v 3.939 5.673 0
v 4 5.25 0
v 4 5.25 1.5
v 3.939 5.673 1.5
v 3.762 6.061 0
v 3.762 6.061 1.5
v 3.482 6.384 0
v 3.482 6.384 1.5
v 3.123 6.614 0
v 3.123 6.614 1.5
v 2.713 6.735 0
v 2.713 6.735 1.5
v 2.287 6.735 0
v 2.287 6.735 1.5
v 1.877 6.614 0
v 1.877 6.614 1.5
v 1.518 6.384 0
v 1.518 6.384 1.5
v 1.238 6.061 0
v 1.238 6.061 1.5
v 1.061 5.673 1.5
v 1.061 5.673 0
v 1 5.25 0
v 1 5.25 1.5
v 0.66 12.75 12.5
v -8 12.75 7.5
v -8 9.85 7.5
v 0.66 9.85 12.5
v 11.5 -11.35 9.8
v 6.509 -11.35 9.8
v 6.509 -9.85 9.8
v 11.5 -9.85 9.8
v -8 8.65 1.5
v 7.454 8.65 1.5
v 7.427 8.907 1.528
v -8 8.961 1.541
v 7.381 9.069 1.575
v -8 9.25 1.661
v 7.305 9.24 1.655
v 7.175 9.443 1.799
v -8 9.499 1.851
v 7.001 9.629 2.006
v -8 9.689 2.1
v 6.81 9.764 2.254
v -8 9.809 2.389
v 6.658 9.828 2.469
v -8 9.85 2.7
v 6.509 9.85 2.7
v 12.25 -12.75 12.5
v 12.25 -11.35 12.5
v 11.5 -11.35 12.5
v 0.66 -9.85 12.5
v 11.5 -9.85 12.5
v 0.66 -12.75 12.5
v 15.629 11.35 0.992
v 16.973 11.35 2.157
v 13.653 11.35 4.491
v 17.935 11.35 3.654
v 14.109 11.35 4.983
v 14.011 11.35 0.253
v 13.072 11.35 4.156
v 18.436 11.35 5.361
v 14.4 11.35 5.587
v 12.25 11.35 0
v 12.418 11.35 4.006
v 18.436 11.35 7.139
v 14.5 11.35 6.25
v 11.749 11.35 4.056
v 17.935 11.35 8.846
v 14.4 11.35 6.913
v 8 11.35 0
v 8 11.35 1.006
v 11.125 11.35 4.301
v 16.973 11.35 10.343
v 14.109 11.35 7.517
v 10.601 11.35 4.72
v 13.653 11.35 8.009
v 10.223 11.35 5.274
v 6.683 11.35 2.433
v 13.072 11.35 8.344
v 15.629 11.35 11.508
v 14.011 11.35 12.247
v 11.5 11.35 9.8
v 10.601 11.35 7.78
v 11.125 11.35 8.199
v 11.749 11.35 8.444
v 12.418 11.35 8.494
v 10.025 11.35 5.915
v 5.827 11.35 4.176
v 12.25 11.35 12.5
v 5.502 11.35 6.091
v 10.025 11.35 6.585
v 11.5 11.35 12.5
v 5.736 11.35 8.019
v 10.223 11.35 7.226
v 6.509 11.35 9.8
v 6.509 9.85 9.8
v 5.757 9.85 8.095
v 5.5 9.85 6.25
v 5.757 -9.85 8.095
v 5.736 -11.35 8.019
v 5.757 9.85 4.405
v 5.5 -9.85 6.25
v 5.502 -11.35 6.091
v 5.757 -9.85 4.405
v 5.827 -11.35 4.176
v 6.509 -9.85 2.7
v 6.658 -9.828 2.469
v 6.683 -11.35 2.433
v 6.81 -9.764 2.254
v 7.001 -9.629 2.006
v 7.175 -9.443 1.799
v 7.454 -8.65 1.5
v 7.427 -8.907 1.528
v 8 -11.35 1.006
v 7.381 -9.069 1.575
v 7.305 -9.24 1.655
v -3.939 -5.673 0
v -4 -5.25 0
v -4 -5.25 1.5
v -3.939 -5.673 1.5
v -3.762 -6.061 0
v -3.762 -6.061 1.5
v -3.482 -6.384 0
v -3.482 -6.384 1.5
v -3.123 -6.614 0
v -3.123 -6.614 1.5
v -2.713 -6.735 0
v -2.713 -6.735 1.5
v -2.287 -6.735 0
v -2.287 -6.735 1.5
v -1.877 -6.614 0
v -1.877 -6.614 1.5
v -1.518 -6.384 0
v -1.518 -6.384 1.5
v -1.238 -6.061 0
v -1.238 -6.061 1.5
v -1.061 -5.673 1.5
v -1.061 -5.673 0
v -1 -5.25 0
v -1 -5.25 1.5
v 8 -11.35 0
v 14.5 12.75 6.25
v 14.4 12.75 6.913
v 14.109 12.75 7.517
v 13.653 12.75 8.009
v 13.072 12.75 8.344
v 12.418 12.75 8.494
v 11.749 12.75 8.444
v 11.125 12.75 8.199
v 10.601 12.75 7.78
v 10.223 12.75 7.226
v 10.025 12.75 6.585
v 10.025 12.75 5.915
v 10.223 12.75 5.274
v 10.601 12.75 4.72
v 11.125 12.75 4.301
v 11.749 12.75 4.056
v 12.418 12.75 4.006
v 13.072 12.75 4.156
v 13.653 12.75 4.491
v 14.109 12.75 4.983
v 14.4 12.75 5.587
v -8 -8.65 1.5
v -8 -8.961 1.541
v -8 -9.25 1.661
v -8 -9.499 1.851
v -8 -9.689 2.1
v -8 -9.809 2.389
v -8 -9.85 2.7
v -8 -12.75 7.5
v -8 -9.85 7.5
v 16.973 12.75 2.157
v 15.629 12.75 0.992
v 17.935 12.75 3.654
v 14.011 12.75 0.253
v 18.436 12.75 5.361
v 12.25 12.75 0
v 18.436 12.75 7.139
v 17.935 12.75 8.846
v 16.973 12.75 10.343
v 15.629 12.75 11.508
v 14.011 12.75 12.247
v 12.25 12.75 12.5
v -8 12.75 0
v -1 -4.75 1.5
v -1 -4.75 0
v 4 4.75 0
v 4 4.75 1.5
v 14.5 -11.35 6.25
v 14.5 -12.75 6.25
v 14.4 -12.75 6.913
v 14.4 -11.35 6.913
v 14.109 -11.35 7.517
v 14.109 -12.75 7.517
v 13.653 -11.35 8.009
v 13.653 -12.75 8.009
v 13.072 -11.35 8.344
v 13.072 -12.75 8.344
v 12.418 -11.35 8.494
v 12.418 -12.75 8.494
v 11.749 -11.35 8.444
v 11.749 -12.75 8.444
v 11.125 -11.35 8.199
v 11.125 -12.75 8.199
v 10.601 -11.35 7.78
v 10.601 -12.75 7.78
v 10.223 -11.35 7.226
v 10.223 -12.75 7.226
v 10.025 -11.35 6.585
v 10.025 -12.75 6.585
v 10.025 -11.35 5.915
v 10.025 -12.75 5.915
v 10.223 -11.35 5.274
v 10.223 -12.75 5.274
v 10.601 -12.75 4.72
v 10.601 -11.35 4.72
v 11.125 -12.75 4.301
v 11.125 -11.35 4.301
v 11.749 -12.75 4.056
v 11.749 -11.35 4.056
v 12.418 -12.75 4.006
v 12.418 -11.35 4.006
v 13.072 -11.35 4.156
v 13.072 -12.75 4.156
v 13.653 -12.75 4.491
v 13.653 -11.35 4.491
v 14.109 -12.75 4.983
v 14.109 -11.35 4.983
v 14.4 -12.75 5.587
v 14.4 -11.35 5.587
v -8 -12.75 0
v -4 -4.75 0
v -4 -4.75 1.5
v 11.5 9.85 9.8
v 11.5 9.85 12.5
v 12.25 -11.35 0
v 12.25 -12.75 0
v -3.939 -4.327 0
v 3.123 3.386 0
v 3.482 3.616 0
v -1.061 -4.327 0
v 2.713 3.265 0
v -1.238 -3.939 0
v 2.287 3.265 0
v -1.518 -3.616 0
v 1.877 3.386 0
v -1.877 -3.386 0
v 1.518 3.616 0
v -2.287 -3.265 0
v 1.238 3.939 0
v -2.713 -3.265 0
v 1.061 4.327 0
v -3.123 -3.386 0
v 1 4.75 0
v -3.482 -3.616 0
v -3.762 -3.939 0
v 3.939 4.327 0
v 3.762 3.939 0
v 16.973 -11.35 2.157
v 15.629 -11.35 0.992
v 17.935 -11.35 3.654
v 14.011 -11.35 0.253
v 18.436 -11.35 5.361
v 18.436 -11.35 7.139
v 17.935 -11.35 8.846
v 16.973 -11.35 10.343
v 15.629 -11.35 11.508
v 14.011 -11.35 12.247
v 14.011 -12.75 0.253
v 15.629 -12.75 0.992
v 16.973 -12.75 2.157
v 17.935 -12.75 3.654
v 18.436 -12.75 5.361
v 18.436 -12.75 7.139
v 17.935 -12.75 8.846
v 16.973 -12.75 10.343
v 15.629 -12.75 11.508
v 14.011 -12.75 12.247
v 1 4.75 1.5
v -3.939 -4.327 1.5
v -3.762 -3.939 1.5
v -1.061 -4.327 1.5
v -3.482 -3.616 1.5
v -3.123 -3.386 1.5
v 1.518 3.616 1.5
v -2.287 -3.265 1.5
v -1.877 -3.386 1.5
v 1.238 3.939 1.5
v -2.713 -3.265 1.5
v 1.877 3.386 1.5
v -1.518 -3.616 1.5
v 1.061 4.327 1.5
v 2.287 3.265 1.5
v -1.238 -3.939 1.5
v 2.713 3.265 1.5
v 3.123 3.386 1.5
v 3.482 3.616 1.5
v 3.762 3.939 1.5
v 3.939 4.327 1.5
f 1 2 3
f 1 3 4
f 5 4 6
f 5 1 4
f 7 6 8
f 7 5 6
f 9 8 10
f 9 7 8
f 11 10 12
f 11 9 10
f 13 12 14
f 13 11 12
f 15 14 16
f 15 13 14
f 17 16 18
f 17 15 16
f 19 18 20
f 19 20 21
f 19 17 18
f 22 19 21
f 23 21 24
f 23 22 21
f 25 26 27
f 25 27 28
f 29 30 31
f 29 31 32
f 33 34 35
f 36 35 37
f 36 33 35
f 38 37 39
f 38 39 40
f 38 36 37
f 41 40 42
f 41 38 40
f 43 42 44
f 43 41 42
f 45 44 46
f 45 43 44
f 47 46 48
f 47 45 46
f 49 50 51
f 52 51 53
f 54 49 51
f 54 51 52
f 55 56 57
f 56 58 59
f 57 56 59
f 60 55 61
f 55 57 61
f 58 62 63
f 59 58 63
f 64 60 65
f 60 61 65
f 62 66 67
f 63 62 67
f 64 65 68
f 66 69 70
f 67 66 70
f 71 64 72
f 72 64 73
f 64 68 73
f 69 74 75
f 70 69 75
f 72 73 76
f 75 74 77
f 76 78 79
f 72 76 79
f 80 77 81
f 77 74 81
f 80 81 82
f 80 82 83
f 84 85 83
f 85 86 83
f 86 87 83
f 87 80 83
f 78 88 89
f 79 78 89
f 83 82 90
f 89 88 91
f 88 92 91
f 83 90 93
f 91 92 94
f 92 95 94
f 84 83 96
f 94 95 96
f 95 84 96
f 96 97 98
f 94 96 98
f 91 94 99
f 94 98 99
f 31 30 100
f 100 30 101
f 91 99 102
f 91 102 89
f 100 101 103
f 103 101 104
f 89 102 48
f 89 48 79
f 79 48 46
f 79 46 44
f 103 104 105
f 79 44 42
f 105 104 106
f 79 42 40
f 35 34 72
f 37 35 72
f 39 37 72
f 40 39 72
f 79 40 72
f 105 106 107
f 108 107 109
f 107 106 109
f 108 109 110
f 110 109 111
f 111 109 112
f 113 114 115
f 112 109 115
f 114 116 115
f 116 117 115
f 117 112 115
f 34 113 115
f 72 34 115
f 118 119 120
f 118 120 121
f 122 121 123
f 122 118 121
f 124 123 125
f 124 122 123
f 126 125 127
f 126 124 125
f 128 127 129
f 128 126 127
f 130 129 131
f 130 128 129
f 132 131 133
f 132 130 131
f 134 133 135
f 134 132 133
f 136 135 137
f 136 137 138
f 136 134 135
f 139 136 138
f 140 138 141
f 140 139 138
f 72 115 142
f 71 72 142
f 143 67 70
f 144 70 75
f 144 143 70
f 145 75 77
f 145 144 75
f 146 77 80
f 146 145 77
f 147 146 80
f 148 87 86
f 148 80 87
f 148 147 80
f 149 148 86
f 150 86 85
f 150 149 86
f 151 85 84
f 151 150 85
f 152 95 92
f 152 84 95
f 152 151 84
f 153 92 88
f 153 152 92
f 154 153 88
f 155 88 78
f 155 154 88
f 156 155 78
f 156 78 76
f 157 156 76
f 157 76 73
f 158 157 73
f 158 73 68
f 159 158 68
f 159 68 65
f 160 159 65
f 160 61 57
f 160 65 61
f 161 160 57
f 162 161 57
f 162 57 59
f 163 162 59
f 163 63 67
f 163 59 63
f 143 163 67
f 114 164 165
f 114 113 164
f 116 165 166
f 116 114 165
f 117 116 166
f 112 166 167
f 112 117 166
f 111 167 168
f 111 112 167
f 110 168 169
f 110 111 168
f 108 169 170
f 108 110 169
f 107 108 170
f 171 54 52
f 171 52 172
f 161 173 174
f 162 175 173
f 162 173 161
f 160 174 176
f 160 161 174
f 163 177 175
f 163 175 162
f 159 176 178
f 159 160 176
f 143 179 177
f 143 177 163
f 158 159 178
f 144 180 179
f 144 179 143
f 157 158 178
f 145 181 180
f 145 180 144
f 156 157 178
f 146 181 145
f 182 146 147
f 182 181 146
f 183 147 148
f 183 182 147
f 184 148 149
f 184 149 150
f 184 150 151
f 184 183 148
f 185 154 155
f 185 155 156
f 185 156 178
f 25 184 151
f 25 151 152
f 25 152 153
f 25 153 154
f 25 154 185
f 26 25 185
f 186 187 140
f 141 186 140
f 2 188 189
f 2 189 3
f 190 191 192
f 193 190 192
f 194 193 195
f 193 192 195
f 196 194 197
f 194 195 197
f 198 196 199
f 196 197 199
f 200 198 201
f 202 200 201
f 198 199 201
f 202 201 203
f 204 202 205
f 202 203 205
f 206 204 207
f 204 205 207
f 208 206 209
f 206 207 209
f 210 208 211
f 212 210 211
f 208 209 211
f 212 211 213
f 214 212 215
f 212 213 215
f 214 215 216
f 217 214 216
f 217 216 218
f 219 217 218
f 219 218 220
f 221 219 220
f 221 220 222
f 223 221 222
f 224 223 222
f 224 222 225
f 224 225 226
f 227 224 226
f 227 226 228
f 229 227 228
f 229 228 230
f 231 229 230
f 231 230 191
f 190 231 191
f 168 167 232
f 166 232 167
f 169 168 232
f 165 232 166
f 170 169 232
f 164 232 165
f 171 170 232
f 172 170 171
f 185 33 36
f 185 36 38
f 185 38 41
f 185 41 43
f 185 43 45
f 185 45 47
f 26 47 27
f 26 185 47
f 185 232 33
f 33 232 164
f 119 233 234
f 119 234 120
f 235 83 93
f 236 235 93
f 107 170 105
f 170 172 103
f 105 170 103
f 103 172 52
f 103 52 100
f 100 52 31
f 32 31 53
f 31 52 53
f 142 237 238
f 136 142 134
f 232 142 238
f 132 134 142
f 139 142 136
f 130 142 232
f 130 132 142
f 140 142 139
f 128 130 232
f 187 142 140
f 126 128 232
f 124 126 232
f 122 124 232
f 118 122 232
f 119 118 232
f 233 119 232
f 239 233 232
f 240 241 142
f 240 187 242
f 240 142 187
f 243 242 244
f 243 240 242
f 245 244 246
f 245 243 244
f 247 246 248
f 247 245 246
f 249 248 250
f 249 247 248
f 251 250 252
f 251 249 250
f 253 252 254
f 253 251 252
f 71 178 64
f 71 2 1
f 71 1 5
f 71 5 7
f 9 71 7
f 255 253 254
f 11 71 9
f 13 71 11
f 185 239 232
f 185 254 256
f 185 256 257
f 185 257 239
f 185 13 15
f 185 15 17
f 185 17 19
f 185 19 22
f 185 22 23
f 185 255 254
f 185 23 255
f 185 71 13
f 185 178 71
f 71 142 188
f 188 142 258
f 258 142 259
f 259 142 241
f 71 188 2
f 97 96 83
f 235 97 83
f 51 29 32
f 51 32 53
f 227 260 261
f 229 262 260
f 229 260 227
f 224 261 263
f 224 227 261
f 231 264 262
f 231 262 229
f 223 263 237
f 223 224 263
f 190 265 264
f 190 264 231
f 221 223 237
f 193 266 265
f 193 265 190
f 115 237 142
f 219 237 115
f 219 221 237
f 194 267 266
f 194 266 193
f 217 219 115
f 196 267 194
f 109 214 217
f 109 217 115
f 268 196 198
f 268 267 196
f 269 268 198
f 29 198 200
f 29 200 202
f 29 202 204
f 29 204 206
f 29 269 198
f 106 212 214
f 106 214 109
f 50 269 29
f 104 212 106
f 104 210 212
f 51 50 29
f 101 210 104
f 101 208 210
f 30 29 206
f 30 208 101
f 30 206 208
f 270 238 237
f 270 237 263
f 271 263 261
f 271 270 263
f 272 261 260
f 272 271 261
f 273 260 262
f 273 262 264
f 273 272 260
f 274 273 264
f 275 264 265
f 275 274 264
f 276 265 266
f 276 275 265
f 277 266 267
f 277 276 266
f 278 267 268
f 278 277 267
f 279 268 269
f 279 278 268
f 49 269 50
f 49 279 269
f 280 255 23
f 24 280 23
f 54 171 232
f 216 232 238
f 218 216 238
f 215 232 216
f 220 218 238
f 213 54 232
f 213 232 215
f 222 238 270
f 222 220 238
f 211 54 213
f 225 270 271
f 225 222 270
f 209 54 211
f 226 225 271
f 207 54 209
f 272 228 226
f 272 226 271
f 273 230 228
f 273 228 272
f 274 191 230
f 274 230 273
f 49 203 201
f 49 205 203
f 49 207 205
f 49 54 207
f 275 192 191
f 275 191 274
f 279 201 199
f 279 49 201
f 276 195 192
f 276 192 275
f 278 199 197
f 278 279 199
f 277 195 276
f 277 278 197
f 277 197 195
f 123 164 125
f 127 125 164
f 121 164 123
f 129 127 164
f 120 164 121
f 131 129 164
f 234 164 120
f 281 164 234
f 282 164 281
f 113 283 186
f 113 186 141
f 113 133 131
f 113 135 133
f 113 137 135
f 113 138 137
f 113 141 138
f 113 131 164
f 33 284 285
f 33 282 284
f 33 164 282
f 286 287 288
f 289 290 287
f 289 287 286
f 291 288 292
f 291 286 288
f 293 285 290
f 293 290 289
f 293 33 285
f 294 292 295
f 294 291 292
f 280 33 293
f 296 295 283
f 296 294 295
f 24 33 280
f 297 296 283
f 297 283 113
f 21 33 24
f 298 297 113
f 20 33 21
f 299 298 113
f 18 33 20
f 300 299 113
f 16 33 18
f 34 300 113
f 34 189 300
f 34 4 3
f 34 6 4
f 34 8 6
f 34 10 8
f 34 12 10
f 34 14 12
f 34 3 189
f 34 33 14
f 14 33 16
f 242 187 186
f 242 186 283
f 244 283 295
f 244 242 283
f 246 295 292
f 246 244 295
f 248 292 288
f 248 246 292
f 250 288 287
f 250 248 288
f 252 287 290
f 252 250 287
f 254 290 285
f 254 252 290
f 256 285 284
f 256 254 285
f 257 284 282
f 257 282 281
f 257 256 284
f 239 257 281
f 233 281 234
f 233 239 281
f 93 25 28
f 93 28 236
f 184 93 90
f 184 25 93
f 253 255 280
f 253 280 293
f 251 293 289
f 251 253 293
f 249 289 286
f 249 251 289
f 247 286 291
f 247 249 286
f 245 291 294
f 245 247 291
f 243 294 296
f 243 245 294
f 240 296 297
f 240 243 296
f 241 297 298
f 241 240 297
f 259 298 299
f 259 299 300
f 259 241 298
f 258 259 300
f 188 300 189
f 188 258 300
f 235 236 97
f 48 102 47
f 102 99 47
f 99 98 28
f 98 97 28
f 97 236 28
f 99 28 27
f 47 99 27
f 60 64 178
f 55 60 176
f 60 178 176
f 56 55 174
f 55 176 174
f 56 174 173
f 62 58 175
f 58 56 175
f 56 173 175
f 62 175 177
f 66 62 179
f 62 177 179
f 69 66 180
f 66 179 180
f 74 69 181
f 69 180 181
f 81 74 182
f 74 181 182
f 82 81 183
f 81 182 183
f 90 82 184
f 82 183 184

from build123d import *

# Parameters (mm, degrees)
SKETCH002_W     = 16
SKETCH002_H     = 25.5
PAD_DEPTH       = 1.5
SKETCH003_R     = 2.25
PAD001_DEPTH    = 2.9
SKETCH004_R     = 2.25
PAD002_DEPTH    = 2.9
POCKET_DEPTH    = 11.35
POCKET001_DEPTH = 11.35
FILLET_R        = 1.2


with BuildPart() as part:
    # Sketch002 → Pad (new body)
    with BuildSketch(Plane.XY):
        Rectangle(SKETCH002_W, SKETCH002_H)
        with BuildLine():
            ThreePointArc((1, 4.75), (2.5, 3.25), (4, 4.75))
            Line((4, 4.75), (4, 5.25))
            ThreePointArc((4, 5.25), (2.5, 6.75), (1, 5.25))
            Line((1, 4.75), (1, 5.25))
        make_face(mode=Mode.SUBTRACT)
        with BuildLine():
            ThreePointArc((-1, -4.75), (-2.5, -3.25), (-4, -4.75))
            Line((-4, -4.75), (-4, -5.25))
            ThreePointArc((-4, -5.25), (-2.5, -6.75), (-1, -5.25))
            Line((-1, -4.75), (-1, -5.25))
        make_face(mode=Mode.SUBTRACT)
    extrude(amount=PAD_DEPTH)

    # Sketch003 → Pad001 (join)
    with BuildSketch(Plane.XZ.offset(12.75)):
        with BuildLine():
            ThreePointArc((12.25, 0), (18.500032, 6.25), (12.25, 12.5))
            Line((12.25, 12.5), (0.660254, 12.5))
            Line((0.660254, 12.5), (-8, 7.5))
            Line((-8, 7.5), (-8, 0))
            Line((-8, 0), (12.25, 0))
        make_face()
        with Locations((12.25, 6.25)):
            Circle(SKETCH003_R, mode=Mode.SUBTRACT)
    extrude(amount=-PAD001_DEPTH)

    # Sketch004 → Pad002 (join)
    with BuildSketch(Plane.XZ.offset(-12.75)):
        with BuildLine():
            Line((12.25, 0), (-8, 0))
            Line((-8, 0), (-8, 7.5))
            Line((-8, 7.5), (0.660254, 12.5))
            Line((0.660254, 12.5), (12.25, 12.5))
            ThreePointArc((12.25, 0), (18.500035, 6.25), (12.25, 12.5))
        make_face()
        with Locations((12.250035, 6.25)):
            Circle(SKETCH004_R, mode=Mode.SUBTRACT)
    extrude(amount=PAD002_DEPTH)

    # Sketch005 → Pocket (cut)
    with BuildSketch(Plane.XZ.offset(11.35)):
        with BuildLine():
            Line((18.6, 12.5), (18.6, 0))
            Line((8, 0), (18.6, 0))
            Line((8, 1.005956), (8, 0))
            ThreePointArc((6.50892, 9.8), (5.594985, 5.121605), (8, 1.005956))
            Line((6.50892, 9.8), (11.5, 9.8))
            Line((11.5, 9.8), (11.5, 12.5))
            Line((11.5, 12.5), (18.6, 12.5))
        make_face()
    extrude(amount=-POCKET_DEPTH, mode=Mode.SUBTRACT)

    # Sketch006 → Pocket001 (cut)
    with BuildSketch(Plane.XZ.offset(-11.35)):
        with BuildLine():
            Line((18.6, 12.5), (18.6, 0))
            Line((8, 0), (18.6, 0))
            Line((8, 1.005956), (8, 0))
            ThreePointArc((6.50892, 9.8), (5.594985, 5.121605), (8, 1.005956))
            Line((6.50892, 9.8), (11.5, 9.8))
            Line((11.5, 9.8), (11.5, 12.5))
            Line((11.5, 12.5), (18.6, 12.5))
        make_face()
    extrude(amount=POCKET001_DEPTH, mode=Mode.SUBTRACT)

    # Fillet
    fillet_edges = [part.edges().sort_by_distance(p)[0] for p in [
        (-0.272916, 9.85, 1.5),
        (-0.272916, -9.85, 1.5),
    ]]
    fillet(fillet_edges, radius=FILLET_R)


solid = part.part
